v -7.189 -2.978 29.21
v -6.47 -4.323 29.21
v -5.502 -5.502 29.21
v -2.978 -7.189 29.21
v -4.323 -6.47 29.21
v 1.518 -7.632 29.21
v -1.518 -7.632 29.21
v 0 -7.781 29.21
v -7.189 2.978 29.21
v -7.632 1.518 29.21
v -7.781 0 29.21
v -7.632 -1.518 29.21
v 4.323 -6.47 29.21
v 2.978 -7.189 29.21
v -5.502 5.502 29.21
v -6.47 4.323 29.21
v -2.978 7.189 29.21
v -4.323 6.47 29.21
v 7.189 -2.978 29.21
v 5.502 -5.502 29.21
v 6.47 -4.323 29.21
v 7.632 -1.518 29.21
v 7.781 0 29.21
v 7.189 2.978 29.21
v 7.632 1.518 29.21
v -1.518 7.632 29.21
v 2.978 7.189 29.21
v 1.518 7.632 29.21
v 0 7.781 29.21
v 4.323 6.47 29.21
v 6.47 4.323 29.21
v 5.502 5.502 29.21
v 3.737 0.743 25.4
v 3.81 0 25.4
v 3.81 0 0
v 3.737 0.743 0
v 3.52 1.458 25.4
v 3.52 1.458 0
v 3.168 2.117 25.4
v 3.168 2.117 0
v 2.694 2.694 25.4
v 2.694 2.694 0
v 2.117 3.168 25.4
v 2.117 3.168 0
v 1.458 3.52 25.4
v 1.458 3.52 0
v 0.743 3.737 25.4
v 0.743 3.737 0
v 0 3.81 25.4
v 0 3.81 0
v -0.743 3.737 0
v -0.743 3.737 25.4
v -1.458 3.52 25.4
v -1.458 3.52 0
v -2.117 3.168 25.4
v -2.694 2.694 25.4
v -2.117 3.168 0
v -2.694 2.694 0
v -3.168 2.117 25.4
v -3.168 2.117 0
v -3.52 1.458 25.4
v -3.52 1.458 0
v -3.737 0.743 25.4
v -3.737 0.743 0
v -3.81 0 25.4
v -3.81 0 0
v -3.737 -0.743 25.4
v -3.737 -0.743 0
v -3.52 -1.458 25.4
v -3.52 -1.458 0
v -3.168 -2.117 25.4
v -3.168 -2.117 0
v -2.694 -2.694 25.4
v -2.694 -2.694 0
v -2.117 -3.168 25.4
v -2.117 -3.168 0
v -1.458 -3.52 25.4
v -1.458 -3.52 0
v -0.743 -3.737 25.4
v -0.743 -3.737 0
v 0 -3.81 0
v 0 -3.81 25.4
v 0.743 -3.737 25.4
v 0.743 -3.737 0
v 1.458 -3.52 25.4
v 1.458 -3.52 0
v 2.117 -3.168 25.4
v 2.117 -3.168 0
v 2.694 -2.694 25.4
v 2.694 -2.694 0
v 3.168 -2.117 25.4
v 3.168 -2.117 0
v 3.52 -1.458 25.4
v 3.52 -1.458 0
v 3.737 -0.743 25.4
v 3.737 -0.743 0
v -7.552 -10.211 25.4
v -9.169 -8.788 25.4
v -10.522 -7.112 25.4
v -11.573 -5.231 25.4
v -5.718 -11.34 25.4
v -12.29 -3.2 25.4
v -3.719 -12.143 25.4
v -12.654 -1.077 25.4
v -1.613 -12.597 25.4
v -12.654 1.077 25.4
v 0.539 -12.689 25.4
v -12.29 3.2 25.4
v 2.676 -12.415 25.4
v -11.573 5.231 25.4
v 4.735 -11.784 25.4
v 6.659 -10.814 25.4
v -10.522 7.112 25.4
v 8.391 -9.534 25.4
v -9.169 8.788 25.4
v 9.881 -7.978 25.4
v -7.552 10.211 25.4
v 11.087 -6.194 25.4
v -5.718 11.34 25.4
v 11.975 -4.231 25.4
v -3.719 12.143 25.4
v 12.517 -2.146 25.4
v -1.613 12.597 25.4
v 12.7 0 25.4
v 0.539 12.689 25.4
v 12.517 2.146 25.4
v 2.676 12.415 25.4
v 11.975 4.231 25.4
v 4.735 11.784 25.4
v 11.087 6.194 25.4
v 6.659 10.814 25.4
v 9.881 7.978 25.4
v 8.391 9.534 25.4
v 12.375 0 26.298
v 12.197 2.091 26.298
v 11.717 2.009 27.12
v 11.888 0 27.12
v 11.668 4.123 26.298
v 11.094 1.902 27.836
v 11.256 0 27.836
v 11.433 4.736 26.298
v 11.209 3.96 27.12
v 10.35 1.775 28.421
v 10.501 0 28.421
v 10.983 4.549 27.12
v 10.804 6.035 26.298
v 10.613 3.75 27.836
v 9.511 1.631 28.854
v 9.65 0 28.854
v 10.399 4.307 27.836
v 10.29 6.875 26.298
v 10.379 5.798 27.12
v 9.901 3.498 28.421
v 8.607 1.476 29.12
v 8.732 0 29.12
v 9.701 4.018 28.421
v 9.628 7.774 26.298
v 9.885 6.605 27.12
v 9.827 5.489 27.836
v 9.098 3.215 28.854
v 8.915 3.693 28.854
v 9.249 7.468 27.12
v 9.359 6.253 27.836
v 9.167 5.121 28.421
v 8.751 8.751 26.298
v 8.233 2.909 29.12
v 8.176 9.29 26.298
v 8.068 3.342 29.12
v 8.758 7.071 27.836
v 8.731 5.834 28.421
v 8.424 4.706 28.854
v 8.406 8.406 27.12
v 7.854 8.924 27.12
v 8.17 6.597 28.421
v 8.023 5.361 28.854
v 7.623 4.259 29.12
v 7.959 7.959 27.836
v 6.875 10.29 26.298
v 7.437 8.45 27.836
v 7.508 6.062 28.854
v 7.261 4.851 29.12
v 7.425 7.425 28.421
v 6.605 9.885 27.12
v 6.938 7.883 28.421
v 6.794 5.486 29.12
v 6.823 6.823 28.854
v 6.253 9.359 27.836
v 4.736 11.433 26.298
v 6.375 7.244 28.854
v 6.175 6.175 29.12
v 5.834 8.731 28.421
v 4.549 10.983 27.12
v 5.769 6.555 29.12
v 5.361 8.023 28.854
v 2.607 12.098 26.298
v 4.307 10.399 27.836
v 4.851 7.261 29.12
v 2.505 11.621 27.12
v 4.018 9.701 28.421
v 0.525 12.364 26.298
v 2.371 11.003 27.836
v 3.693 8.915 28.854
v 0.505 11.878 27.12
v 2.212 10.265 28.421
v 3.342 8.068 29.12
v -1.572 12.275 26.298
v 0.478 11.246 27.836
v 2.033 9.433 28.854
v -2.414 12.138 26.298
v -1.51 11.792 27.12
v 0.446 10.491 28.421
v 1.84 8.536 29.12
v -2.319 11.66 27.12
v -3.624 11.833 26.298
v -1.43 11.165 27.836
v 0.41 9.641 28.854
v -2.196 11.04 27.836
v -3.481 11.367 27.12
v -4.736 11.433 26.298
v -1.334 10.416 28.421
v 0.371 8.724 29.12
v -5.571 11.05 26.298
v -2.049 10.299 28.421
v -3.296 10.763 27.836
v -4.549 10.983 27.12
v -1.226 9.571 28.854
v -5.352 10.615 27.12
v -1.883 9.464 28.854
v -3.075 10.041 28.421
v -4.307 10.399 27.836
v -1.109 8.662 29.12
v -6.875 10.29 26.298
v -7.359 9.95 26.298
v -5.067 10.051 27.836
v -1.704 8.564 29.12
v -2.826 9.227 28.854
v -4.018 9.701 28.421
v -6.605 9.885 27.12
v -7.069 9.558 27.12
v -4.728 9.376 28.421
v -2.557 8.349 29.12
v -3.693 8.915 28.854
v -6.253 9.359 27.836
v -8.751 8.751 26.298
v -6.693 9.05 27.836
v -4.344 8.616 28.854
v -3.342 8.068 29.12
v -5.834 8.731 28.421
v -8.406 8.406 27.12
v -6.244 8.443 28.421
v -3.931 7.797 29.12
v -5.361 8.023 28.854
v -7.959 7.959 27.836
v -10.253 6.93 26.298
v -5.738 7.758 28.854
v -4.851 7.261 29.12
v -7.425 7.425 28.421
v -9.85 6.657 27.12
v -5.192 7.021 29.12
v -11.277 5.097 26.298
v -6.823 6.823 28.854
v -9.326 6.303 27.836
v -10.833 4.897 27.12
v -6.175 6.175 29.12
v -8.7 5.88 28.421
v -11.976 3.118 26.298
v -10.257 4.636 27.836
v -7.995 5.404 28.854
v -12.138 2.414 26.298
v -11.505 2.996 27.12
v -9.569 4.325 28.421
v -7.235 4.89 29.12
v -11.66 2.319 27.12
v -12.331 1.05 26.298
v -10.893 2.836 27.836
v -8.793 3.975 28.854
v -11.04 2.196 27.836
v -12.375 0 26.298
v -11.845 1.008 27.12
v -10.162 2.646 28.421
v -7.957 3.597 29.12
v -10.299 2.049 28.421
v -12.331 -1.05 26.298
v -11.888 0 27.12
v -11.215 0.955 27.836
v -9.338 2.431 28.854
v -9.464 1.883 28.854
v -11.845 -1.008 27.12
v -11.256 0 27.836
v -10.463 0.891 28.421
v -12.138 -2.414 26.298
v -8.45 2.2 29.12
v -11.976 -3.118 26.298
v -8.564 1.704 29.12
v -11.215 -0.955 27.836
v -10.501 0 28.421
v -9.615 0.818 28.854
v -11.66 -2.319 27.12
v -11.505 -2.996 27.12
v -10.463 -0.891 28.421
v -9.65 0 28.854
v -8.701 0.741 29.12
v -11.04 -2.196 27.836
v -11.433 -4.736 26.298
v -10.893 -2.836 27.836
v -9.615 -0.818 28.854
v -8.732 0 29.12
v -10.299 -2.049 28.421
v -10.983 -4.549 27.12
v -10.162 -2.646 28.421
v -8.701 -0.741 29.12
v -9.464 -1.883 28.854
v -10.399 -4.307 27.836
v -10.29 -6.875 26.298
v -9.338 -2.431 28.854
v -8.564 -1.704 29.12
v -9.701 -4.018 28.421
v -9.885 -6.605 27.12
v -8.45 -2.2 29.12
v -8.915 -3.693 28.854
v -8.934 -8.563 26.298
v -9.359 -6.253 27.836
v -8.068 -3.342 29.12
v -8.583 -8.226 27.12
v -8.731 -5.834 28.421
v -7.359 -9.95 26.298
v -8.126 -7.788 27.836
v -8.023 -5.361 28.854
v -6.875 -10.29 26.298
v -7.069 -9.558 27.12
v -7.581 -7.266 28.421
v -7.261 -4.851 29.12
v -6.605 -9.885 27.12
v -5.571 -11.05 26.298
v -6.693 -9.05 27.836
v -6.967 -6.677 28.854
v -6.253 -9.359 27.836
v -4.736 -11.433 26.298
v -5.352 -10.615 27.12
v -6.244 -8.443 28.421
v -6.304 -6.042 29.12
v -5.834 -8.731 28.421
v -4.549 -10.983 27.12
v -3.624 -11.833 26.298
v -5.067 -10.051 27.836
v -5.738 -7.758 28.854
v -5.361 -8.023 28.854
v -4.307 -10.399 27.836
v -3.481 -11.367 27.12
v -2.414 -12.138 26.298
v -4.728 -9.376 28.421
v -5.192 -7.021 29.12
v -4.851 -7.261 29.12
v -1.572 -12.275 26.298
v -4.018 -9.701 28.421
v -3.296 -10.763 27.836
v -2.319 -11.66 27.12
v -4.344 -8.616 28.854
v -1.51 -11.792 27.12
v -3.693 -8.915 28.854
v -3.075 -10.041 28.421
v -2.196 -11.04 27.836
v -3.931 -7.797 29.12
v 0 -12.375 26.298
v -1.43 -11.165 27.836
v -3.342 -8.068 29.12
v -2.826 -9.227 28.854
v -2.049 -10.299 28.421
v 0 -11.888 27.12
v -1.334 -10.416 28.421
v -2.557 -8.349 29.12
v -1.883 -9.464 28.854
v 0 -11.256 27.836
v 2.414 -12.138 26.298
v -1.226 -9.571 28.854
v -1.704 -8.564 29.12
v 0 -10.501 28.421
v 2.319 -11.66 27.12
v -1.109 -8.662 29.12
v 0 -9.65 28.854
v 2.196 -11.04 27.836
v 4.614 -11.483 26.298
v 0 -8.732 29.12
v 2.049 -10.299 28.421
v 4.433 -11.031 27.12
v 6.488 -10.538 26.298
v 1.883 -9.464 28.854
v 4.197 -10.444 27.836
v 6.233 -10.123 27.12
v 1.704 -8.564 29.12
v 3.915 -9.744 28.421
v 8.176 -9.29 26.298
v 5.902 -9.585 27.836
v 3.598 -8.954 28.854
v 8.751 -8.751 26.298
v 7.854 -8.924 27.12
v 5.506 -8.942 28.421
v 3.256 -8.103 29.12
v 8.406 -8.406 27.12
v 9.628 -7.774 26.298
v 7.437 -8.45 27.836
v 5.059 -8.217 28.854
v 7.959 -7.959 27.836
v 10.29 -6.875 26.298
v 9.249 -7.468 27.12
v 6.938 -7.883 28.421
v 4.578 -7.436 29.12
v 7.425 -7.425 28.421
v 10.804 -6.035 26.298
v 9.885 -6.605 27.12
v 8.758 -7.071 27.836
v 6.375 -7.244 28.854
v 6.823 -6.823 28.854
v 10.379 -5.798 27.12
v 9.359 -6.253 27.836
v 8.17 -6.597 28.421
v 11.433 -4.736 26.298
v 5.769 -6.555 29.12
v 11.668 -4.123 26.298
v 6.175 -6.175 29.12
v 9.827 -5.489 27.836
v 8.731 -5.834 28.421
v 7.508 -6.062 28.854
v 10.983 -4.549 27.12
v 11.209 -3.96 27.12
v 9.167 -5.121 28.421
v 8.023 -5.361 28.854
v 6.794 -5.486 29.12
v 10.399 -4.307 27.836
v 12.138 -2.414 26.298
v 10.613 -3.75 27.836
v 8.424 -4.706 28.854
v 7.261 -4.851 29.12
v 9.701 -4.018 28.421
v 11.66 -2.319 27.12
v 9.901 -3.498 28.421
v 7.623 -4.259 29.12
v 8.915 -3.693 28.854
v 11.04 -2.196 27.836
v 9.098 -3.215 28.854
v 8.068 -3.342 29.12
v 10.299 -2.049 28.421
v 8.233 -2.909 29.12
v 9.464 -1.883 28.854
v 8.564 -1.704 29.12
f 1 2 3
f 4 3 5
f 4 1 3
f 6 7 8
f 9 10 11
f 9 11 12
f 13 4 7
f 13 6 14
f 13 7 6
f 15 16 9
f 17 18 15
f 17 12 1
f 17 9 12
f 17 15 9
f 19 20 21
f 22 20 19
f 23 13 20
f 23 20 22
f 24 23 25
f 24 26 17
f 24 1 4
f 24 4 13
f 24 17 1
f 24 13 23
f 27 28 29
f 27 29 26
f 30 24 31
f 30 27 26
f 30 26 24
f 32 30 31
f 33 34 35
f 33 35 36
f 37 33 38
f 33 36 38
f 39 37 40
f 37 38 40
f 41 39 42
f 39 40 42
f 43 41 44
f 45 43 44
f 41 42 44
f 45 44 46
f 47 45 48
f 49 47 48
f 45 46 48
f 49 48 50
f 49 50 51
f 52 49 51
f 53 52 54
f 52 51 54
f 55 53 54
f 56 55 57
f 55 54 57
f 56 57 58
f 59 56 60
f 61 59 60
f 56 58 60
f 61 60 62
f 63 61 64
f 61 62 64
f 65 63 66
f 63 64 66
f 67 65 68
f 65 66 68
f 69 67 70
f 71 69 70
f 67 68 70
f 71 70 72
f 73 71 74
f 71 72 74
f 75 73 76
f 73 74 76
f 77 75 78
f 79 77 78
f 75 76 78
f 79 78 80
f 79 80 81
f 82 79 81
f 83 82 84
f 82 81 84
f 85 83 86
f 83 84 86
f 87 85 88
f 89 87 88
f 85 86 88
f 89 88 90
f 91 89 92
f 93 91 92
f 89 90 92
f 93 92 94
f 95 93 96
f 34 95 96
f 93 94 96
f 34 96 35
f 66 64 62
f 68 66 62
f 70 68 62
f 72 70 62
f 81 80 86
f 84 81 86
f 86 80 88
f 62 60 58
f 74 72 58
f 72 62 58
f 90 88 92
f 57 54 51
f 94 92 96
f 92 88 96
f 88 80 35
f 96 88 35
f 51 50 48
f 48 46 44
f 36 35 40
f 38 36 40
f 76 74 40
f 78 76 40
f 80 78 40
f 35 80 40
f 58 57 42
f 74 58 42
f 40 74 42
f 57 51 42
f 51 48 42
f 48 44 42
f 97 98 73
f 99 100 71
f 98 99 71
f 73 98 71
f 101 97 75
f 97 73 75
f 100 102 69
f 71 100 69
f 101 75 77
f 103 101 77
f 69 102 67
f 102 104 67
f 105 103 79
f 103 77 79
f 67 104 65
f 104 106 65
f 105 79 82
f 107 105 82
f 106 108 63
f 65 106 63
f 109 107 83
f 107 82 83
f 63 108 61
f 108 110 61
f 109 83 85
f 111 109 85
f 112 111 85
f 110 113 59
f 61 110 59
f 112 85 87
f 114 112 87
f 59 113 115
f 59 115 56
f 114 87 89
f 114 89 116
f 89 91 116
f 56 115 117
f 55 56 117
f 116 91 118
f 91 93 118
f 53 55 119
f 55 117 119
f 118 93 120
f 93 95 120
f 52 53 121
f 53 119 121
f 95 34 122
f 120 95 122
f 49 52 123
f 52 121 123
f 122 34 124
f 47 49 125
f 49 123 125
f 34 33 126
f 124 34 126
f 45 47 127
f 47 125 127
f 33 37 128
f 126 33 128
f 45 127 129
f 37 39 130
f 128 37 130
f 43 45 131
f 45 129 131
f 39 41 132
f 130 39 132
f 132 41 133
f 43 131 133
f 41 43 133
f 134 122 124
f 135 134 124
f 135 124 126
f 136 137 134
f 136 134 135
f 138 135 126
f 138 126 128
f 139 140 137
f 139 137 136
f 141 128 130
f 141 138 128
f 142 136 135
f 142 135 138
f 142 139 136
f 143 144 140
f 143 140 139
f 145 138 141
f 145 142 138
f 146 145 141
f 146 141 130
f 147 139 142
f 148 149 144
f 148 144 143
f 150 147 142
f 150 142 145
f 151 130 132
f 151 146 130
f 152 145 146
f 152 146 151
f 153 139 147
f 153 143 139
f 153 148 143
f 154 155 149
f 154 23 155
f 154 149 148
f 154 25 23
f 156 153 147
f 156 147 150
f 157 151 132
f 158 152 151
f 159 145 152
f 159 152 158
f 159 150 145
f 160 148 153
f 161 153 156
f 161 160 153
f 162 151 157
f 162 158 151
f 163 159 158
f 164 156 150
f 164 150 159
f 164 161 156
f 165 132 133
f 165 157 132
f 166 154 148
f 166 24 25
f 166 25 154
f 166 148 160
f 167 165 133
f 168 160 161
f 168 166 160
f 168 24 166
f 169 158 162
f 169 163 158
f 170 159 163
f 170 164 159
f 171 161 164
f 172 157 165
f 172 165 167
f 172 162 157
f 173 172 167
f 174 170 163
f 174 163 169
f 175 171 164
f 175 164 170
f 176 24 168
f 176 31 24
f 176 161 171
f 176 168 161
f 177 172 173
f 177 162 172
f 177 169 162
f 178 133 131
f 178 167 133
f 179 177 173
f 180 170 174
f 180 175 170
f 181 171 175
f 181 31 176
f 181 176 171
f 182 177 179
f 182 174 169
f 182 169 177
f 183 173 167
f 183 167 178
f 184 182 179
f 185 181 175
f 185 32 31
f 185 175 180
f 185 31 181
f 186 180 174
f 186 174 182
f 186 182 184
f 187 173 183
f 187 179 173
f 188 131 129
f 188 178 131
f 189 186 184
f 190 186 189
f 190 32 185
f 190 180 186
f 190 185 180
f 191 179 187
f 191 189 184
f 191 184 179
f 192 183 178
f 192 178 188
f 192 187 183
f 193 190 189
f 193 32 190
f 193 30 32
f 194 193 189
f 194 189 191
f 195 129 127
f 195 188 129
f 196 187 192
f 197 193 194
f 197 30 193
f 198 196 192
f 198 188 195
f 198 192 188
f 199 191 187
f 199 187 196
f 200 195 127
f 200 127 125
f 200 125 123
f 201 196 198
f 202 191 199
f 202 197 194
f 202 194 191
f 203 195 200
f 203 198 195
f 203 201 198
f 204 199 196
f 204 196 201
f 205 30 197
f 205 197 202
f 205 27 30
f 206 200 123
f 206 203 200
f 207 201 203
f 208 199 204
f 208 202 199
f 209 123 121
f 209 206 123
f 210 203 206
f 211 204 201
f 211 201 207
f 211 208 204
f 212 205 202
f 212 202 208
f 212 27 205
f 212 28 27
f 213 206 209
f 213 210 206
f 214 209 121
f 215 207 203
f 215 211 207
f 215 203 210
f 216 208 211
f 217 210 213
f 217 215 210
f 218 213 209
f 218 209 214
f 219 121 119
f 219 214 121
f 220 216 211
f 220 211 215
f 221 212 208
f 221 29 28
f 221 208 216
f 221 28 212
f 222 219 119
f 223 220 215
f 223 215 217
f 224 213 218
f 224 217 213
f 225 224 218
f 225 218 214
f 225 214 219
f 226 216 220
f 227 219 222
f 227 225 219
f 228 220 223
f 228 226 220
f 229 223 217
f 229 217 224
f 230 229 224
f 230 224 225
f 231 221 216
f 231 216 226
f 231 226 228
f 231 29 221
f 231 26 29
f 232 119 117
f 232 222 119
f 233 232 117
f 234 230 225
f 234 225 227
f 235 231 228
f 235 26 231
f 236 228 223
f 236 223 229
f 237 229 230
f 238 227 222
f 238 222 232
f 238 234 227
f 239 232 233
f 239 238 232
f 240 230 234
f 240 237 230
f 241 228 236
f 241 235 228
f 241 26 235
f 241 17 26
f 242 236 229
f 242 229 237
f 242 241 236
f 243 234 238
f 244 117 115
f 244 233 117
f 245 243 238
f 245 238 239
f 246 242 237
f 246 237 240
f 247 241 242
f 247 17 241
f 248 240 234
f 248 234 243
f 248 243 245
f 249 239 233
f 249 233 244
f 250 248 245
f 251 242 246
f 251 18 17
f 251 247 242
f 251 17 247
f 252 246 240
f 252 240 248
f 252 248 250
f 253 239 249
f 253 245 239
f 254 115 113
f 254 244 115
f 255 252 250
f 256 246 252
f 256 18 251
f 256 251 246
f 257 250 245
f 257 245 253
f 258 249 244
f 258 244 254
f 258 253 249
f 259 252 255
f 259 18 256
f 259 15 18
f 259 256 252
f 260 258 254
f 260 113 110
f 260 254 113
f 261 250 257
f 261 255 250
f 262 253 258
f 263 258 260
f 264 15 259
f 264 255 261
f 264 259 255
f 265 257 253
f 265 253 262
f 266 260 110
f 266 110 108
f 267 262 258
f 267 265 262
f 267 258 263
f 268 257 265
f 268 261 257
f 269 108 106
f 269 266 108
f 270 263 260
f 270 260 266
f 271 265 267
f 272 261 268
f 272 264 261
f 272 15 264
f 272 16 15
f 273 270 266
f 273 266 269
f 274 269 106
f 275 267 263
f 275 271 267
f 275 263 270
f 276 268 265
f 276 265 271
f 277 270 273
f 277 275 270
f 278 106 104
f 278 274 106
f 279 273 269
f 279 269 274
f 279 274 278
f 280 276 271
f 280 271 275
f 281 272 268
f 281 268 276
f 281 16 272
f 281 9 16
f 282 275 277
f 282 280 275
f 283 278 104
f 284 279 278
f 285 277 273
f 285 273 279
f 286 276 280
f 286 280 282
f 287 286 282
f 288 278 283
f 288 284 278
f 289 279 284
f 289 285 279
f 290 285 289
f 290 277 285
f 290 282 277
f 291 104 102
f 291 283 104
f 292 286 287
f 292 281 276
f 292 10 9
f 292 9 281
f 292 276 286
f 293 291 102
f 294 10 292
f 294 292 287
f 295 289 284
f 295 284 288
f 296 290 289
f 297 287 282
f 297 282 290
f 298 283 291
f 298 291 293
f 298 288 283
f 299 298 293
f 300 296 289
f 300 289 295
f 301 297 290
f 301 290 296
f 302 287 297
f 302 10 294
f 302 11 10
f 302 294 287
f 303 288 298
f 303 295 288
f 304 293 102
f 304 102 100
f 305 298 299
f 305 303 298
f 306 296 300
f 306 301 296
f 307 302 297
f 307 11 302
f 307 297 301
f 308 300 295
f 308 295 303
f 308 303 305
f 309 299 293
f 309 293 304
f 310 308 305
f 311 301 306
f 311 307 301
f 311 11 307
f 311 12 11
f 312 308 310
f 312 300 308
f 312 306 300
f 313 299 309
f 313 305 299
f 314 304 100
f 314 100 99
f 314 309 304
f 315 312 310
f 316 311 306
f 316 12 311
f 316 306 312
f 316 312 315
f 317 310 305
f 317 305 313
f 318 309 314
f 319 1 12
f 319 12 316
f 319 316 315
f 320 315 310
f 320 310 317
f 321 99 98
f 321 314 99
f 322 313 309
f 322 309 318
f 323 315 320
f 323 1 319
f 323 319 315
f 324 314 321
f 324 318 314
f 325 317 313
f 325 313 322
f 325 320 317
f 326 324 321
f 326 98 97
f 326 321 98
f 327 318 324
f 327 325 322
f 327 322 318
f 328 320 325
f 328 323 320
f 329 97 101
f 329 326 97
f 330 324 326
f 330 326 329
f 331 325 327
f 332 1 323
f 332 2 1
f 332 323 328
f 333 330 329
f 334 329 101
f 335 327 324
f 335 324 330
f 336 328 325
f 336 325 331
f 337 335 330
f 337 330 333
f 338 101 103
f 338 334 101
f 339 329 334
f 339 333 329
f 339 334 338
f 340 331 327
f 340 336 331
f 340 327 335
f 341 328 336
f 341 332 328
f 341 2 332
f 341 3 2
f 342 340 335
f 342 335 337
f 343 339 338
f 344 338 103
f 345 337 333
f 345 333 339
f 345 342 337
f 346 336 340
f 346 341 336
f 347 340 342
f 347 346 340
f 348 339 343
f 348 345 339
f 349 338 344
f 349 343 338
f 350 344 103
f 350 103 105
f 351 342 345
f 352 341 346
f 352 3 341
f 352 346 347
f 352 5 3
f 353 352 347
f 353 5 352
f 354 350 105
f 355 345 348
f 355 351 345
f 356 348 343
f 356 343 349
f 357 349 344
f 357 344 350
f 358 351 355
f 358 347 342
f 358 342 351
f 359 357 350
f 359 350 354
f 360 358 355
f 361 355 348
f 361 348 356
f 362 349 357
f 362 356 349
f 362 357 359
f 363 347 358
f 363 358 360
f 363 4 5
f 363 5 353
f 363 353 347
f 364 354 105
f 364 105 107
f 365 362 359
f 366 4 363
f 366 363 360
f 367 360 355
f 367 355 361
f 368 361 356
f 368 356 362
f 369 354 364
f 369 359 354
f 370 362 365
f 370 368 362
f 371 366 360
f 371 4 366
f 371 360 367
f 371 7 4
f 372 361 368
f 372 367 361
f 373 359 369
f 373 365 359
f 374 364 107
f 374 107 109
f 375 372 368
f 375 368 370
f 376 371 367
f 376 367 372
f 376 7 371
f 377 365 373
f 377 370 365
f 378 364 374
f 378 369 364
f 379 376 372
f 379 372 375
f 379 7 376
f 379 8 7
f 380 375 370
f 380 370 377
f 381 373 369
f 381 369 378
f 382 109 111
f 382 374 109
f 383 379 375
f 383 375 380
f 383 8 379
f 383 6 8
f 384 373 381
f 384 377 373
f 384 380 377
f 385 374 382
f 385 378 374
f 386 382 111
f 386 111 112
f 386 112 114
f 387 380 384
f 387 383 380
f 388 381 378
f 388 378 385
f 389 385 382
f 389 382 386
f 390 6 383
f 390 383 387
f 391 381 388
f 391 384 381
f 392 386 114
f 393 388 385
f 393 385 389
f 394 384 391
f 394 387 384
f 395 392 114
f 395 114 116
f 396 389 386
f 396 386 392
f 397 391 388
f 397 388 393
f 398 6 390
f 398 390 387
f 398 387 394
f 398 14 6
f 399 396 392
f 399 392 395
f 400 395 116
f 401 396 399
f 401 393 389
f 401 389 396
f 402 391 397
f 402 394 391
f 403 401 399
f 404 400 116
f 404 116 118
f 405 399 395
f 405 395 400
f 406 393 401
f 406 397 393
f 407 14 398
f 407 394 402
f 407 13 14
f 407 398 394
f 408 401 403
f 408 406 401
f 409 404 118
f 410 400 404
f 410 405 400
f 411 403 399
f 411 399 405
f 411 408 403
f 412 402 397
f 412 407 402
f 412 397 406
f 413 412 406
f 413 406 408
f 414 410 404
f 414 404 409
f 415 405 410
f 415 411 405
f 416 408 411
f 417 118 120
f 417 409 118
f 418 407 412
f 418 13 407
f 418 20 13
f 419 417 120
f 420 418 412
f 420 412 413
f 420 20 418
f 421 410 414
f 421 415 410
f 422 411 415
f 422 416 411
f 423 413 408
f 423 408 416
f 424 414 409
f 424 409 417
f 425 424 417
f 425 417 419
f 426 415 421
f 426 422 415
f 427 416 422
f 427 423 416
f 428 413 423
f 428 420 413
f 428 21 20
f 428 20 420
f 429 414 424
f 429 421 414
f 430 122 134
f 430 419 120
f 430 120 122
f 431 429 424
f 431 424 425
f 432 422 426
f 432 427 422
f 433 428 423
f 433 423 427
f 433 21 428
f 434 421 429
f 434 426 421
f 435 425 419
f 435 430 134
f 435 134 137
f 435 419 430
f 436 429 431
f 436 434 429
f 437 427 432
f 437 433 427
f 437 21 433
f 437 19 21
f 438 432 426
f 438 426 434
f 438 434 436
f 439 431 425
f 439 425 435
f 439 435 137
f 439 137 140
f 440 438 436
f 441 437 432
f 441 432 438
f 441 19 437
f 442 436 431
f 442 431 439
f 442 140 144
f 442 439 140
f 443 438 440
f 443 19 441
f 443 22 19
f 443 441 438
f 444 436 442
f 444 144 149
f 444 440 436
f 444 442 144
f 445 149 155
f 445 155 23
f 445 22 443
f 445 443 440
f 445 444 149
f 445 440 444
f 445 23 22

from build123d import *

# Parameters (mm, degrees)
F0_R     = 3.81
F1_DEPTH = 25.4
F2_R     = 6.35
F2_R_2   = 3.81
F3_DEPTH = 3.81
F2_R_3   = 12.7
F4_DEPTH = 3.81


# Not quite as in the source:
# - a fillet or chamfer that OpenCascade refuses, or shapes differently, is made with other operations: its cross-section is extruded or revolved along the edge and cut away or added


with BuildPart() as f1:
    # F0 (on Top) → F1 (new body)
    with BuildSketch(Plane.XY):
        Circle(F0_R)
    extrude(amount=F1_DEPTH)

    # F2 (on face) → F3 (join)
    with BuildSketch(Plane.XY.offset(25.4)):
        Circle(F2_R)
        Circle(F2_R_2, mode=Mode.SUBTRACT)
        Circle(F2_R_2)
    extrude(amount=F3_DEPTH)

    # F2 (on face) → F4 (join)
    with BuildSketch(Plane.XY.offset(25.4)):
        Circle(F2_R_3)
        Circle(F2_R, mode=Mode.SUBTRACT)
    extrude(amount=F4_DEPTH)

    # F5: fillet of radius 5.08 on 1 edges, made by hand

    # F5_s1 → F5_t2 (revolve, cut)
    with BuildSketch(Plane.XZ):
        with BuildLine():
            ThreePointArc((12.7, 25.4), (10.8921631237, 28.1460926284), (7.7813111503, 29.21))
            Line((7.7813111503, 29.21), (12.7, 29.21))
            Line((12.7, 29.21), (12.7, 25.4))
        make_face()
    revolve(axis=Axis((0, 0, 29.21), (0, 0, 1)), mode=Mode.SUBTRACT)


solid = f1.part
